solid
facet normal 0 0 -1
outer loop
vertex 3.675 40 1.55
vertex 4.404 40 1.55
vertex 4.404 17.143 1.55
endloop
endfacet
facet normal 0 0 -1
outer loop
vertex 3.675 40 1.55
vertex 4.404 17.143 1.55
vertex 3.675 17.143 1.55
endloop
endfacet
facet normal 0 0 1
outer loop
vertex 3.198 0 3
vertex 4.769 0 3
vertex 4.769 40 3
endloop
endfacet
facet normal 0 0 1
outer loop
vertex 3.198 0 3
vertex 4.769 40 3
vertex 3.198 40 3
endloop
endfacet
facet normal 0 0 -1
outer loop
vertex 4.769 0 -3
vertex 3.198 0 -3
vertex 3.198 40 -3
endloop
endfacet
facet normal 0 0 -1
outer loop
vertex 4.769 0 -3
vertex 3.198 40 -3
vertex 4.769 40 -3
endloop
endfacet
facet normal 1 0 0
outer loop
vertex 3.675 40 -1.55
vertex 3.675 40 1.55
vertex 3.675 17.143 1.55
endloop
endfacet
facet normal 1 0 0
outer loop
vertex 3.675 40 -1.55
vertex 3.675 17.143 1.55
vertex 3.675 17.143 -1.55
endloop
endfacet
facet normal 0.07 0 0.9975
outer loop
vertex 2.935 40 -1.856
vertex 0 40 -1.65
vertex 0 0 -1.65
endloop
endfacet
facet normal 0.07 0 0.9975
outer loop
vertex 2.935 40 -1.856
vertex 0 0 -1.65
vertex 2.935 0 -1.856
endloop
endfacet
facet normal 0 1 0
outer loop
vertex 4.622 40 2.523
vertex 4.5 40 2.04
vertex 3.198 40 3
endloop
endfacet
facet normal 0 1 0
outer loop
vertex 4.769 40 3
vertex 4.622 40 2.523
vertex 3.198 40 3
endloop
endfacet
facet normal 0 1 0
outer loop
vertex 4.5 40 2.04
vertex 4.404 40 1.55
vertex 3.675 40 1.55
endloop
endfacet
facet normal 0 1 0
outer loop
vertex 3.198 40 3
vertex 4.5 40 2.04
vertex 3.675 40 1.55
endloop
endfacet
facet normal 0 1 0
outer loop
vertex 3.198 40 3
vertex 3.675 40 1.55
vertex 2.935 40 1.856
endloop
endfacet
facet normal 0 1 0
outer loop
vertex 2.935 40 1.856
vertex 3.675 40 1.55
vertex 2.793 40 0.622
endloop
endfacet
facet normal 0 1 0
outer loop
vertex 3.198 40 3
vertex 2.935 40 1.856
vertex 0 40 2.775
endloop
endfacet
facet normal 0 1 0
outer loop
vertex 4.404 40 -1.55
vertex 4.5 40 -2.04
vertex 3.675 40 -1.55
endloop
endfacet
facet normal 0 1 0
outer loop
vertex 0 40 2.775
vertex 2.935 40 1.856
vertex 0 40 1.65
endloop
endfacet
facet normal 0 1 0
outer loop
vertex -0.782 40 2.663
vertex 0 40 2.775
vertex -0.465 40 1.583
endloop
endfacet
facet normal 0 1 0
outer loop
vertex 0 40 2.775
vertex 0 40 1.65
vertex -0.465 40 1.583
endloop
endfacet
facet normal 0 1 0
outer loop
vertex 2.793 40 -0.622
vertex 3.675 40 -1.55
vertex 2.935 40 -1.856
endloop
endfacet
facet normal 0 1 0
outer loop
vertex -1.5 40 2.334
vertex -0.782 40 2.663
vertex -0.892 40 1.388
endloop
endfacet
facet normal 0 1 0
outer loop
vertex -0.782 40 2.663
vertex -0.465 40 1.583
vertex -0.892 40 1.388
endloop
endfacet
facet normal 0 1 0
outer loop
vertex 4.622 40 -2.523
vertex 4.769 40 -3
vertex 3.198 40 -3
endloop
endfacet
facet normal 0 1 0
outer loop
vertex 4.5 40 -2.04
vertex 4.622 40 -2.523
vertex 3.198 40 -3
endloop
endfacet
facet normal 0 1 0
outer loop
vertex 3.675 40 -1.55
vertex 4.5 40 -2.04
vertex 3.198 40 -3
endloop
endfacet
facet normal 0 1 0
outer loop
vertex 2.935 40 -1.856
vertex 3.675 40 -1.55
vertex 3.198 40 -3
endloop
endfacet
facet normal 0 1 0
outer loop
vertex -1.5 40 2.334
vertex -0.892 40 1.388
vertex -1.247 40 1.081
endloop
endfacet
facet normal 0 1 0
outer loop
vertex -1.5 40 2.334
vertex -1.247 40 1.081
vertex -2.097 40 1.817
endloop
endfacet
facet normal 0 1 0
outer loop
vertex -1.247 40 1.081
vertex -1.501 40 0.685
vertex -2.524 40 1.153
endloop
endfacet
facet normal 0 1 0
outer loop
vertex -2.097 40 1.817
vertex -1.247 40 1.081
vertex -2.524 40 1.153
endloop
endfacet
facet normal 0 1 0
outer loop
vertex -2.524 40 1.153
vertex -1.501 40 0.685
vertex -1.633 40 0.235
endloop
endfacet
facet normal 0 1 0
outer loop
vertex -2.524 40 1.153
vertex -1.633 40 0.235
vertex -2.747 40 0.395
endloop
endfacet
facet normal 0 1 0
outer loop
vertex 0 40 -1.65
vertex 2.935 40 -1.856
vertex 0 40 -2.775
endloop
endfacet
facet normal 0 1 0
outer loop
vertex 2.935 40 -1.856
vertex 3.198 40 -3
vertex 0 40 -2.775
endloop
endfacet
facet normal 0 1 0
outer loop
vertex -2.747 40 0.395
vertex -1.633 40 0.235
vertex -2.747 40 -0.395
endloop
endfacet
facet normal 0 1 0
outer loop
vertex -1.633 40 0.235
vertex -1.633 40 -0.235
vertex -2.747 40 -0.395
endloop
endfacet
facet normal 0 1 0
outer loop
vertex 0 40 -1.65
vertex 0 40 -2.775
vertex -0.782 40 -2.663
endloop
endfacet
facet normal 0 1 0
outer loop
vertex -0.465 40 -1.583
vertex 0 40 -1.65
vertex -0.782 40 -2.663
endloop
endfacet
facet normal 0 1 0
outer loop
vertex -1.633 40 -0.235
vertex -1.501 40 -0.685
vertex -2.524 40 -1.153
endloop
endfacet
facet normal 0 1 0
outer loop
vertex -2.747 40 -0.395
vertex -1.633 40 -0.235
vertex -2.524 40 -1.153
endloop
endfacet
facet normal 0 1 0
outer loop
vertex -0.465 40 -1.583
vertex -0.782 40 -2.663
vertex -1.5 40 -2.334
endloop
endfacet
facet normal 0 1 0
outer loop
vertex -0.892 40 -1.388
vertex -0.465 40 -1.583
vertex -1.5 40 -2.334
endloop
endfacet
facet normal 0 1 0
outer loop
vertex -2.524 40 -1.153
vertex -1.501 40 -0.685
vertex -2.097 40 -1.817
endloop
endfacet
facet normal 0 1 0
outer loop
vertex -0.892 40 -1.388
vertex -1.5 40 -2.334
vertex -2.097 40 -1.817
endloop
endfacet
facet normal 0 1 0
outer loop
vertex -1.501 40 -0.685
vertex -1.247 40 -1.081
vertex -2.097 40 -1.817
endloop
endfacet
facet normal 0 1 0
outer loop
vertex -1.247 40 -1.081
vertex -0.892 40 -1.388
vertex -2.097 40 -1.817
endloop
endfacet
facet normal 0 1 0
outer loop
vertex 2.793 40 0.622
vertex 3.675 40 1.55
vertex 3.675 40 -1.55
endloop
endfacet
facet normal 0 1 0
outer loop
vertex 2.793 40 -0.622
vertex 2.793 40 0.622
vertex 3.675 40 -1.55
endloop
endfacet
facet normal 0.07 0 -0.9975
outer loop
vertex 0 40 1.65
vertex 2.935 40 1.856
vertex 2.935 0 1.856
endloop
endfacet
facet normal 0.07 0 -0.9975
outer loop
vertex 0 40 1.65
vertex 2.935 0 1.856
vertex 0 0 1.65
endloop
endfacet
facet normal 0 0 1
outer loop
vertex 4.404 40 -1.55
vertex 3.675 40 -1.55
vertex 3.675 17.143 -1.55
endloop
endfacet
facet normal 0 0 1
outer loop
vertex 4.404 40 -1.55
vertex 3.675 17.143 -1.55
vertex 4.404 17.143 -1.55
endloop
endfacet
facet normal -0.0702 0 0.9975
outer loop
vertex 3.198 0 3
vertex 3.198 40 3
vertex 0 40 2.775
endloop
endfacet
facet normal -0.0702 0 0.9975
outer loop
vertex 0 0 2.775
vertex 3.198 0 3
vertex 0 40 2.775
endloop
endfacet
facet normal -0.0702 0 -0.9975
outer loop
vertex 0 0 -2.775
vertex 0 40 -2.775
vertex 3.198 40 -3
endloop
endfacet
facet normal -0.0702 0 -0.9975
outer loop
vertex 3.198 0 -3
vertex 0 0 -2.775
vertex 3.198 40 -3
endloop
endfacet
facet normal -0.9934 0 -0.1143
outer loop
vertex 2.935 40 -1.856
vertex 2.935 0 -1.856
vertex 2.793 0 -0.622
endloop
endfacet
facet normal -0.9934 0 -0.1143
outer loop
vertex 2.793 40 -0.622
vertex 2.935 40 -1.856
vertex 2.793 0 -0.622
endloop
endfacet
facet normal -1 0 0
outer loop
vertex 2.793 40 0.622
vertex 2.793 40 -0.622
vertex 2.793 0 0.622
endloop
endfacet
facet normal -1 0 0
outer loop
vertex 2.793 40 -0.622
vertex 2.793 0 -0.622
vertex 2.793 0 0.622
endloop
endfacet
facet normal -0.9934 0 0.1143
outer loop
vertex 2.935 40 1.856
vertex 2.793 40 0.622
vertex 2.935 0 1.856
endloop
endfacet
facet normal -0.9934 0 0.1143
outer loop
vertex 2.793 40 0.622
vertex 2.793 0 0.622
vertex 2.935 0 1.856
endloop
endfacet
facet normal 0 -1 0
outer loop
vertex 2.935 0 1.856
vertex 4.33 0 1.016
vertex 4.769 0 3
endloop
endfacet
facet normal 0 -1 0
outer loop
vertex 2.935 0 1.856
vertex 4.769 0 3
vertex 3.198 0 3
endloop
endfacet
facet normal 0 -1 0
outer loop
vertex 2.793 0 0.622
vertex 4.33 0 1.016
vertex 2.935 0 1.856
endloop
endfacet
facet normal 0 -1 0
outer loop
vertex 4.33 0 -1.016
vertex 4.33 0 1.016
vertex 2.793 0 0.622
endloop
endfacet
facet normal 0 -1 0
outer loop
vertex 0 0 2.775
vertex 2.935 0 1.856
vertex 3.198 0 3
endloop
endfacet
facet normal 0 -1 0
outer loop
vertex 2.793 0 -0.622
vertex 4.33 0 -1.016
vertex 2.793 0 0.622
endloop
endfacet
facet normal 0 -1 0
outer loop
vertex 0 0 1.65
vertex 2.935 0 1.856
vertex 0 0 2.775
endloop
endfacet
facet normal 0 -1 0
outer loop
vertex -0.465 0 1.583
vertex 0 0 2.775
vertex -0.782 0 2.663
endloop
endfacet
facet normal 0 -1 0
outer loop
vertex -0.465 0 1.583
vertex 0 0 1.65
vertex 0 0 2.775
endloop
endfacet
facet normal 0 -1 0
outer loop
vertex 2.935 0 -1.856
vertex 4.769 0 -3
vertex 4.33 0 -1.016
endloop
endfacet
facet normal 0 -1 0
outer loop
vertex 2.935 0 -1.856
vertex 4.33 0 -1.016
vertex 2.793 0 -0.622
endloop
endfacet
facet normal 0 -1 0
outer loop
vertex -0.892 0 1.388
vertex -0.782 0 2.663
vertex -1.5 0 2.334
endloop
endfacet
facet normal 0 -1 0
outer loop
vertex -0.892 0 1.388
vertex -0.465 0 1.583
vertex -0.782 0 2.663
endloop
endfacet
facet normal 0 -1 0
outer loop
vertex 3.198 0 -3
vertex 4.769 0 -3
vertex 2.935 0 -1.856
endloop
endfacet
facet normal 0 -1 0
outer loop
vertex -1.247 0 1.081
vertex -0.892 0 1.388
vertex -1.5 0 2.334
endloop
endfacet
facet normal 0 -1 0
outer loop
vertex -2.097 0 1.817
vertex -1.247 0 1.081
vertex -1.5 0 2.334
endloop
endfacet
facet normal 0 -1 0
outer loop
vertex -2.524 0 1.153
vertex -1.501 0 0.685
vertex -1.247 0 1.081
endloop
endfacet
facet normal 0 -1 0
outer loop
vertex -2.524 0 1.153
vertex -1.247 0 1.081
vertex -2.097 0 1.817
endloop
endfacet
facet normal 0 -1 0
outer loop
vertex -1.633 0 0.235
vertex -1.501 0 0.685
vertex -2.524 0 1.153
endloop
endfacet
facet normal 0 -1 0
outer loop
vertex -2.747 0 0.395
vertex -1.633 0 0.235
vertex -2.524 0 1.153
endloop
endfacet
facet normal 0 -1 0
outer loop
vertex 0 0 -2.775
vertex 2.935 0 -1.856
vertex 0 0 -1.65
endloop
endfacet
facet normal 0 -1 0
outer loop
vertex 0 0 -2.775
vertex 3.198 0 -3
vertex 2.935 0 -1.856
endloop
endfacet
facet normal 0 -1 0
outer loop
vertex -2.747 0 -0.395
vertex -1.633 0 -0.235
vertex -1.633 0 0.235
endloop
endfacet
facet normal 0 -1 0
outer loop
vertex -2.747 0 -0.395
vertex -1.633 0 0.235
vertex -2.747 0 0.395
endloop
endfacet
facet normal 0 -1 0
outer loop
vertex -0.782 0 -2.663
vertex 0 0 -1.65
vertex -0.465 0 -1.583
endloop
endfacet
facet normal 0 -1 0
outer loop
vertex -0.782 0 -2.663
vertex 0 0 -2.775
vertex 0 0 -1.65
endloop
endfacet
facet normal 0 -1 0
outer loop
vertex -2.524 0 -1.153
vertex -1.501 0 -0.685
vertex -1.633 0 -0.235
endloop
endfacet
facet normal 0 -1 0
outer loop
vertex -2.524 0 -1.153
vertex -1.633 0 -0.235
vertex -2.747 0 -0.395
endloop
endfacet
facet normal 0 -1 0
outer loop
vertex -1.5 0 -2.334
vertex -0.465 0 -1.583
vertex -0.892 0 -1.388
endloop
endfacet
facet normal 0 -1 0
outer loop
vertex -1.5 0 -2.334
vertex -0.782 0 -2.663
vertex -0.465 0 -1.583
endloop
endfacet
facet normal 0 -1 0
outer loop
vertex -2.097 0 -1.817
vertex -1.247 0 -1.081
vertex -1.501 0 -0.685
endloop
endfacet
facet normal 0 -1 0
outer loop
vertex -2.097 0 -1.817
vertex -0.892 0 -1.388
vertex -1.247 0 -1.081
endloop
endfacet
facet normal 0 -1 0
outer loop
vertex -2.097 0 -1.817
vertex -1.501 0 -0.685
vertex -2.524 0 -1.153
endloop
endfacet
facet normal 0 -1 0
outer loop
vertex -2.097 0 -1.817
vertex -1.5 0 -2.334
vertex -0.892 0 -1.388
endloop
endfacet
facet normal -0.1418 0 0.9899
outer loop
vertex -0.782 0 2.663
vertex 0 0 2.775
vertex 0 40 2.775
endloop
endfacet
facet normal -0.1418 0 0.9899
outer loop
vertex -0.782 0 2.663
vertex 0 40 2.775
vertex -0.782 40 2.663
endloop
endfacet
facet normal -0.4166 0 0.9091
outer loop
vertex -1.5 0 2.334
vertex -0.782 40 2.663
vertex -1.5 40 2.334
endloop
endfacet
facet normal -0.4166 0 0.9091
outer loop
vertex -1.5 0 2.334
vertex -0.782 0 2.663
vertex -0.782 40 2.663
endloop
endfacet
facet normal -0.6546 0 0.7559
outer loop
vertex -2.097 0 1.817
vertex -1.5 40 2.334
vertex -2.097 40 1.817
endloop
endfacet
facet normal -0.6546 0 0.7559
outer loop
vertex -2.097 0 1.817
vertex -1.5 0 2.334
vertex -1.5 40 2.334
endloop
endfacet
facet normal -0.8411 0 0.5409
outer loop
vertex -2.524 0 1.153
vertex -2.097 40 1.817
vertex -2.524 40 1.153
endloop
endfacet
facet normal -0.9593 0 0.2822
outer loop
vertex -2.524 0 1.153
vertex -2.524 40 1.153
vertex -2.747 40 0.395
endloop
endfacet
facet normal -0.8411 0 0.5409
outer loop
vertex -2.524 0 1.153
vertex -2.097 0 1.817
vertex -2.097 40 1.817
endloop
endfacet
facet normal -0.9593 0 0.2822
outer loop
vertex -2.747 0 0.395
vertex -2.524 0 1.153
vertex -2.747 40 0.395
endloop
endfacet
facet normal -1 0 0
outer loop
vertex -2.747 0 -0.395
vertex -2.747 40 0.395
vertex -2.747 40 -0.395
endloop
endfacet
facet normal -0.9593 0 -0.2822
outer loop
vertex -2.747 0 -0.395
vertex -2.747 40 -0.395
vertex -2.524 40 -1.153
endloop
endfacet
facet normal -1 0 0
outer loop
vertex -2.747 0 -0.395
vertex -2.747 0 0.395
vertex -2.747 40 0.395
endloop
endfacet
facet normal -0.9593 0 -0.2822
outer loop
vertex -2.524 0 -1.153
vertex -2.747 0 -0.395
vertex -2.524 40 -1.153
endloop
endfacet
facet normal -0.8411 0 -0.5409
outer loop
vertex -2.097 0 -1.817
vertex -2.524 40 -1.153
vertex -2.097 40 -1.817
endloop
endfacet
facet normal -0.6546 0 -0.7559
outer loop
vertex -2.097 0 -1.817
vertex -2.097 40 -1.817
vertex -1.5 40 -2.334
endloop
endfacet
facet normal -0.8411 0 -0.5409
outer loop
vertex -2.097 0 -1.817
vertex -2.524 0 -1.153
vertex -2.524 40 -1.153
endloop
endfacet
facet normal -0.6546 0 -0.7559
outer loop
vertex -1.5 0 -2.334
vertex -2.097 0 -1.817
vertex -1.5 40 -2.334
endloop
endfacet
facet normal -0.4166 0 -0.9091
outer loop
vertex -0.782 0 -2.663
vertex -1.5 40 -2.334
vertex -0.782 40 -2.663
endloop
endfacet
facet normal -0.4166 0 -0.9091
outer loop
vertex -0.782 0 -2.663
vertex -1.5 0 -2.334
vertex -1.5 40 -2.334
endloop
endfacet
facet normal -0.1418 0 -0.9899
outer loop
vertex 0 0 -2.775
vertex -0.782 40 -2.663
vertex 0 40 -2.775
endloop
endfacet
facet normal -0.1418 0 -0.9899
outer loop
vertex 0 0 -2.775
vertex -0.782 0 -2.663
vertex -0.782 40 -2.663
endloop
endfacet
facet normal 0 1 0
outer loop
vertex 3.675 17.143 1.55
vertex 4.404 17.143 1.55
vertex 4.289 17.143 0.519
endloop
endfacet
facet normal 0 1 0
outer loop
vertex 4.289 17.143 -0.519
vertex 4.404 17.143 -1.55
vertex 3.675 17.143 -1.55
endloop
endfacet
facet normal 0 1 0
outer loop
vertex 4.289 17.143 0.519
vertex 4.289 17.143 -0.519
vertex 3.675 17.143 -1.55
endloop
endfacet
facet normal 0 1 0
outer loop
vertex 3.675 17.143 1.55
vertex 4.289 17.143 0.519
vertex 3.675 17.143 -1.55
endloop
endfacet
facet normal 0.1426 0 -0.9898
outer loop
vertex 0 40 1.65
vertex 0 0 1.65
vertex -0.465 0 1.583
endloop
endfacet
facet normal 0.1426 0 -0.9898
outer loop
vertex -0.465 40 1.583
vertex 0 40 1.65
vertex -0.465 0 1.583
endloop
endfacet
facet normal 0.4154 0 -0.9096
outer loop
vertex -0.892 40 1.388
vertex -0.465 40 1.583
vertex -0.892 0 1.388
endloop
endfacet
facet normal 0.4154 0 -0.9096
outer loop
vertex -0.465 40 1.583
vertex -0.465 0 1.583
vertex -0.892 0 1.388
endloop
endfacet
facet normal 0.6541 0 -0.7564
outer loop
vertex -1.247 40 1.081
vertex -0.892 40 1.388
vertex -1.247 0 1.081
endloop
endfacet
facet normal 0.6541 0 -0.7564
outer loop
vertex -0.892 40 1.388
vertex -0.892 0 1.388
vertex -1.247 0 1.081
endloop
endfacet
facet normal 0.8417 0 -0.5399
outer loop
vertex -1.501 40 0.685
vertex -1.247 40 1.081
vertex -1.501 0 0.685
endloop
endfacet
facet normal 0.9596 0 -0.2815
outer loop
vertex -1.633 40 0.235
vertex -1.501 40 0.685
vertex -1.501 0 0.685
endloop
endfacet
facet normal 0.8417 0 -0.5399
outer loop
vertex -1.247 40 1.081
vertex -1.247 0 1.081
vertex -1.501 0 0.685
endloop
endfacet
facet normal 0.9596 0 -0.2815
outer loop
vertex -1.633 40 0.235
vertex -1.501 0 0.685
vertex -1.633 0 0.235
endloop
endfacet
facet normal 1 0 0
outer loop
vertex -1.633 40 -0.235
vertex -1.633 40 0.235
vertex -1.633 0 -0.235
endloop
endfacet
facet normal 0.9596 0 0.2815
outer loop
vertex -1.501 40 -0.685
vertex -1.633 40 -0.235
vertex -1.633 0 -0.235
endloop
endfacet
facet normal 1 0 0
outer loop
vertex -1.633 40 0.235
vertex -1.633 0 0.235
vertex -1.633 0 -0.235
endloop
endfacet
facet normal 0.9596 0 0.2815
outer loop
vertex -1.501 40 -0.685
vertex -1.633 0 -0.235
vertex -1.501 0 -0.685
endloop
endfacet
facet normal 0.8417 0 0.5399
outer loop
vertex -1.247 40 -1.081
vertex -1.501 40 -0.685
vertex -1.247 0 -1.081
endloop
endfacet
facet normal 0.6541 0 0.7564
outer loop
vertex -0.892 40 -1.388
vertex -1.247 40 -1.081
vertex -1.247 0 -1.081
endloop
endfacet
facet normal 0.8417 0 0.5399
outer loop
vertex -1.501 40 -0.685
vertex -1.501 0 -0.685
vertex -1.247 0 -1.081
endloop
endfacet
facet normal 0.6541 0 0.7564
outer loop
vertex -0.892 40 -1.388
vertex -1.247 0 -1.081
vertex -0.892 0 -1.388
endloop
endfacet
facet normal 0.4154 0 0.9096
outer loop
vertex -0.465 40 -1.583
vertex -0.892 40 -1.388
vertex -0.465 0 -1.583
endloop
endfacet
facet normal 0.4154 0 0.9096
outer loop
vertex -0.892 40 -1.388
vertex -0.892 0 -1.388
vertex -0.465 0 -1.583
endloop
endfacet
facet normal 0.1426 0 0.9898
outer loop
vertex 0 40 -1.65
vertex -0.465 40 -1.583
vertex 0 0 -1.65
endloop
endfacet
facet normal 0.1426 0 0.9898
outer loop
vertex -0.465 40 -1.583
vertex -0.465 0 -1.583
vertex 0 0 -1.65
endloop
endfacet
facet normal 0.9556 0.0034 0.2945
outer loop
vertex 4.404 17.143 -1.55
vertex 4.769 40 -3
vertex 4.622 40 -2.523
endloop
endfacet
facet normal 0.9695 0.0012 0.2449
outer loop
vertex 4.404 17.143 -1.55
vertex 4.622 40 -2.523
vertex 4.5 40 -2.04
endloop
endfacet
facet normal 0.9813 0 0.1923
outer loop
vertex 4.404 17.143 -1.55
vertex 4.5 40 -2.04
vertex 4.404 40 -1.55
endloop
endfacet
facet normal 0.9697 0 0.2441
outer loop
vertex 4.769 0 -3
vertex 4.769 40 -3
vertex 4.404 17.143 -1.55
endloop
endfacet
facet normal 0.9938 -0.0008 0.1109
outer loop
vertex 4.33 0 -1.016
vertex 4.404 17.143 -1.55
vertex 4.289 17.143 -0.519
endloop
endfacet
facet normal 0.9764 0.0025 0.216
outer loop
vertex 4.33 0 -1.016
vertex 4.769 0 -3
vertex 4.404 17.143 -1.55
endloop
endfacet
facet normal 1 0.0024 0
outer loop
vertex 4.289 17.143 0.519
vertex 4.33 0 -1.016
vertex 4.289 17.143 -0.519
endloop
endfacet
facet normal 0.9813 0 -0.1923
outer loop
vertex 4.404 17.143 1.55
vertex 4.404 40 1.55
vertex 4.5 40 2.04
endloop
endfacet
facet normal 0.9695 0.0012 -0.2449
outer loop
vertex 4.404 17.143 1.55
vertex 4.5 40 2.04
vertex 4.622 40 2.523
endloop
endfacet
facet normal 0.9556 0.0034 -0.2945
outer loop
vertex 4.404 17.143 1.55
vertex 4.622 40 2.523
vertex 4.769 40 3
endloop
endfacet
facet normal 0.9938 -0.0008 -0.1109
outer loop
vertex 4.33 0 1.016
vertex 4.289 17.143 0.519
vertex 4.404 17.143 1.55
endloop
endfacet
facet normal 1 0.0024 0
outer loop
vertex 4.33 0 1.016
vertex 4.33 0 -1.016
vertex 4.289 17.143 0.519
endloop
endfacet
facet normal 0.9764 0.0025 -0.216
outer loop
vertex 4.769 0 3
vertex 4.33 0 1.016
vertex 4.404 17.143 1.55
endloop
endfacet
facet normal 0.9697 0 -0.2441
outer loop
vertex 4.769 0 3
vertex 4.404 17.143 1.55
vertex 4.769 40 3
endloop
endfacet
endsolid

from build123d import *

# Parameters (mm, degrees)
BOSS_EXTRUDE1_DEPTH = 40
CUT_EXTRUDE1_DEPTH  = 22.857142857


with BuildPart() as part:
    # Sketch2 → Boss-Extrude1 (new body)
    with BuildSketch(Plane(origin=(0, 0, 0), x_dir=(1, 0, 0), z_dir=(0, 1, 0))):
        with BuildLine():
            Line((0, 2.775), (3.1979918, 3))
            Line((3.1979918, 3), (4.769352085, 3))
            ThreePointArc((4.769352085, 3), (4.275, 0), (4.769352085, -3))
            Line((4.769352085, -3), (3.1979918, -3))
            Line((3.1979918, -3), (0, -2.775))
            ThreePointArc((0, -2.775), (-2.775, 0), (0, 2.775))
        make_face()
        with BuildLine():
            Line((0, 1.65), (2.935008537, 1.856497378))
            ThreePointArc((2.935008537, 1.856497378), (2.775, 0), (2.935008537, -1.856497378))
            Line((2.935008537, -1.856497378), (0, -1.65))
            ThreePointArc((0, -1.65), (-1.65, 0), (0, 1.65))
        make_face(mode=Mode.SUBTRACT)
    extrude(amount=BOSS_EXTRUDE1_DEPTH)

    # Sketch3 → Cut-Extrude1 (cut)
    with BuildSketch(Plane(origin=(0, 40, 0), x_dir=(1, 0, 0), z_dir=(0, 1, 0))):
        with BuildLine():
            Line((3.675, 1.55), (4.404370954, 1.55))
            ThreePointArc((4.404370954, 1.55), (4.275, 0), (4.404370954, -1.55))
            Line((4.404370954, -1.55), (3.675, -1.55))
            Line((3.675, -1.55), (3.675, 1.55))
        make_face()
    extrude(amount=-CUT_EXTRUDE1_DEPTH, mode=Mode.SUBTRACT)


solid = part.part
